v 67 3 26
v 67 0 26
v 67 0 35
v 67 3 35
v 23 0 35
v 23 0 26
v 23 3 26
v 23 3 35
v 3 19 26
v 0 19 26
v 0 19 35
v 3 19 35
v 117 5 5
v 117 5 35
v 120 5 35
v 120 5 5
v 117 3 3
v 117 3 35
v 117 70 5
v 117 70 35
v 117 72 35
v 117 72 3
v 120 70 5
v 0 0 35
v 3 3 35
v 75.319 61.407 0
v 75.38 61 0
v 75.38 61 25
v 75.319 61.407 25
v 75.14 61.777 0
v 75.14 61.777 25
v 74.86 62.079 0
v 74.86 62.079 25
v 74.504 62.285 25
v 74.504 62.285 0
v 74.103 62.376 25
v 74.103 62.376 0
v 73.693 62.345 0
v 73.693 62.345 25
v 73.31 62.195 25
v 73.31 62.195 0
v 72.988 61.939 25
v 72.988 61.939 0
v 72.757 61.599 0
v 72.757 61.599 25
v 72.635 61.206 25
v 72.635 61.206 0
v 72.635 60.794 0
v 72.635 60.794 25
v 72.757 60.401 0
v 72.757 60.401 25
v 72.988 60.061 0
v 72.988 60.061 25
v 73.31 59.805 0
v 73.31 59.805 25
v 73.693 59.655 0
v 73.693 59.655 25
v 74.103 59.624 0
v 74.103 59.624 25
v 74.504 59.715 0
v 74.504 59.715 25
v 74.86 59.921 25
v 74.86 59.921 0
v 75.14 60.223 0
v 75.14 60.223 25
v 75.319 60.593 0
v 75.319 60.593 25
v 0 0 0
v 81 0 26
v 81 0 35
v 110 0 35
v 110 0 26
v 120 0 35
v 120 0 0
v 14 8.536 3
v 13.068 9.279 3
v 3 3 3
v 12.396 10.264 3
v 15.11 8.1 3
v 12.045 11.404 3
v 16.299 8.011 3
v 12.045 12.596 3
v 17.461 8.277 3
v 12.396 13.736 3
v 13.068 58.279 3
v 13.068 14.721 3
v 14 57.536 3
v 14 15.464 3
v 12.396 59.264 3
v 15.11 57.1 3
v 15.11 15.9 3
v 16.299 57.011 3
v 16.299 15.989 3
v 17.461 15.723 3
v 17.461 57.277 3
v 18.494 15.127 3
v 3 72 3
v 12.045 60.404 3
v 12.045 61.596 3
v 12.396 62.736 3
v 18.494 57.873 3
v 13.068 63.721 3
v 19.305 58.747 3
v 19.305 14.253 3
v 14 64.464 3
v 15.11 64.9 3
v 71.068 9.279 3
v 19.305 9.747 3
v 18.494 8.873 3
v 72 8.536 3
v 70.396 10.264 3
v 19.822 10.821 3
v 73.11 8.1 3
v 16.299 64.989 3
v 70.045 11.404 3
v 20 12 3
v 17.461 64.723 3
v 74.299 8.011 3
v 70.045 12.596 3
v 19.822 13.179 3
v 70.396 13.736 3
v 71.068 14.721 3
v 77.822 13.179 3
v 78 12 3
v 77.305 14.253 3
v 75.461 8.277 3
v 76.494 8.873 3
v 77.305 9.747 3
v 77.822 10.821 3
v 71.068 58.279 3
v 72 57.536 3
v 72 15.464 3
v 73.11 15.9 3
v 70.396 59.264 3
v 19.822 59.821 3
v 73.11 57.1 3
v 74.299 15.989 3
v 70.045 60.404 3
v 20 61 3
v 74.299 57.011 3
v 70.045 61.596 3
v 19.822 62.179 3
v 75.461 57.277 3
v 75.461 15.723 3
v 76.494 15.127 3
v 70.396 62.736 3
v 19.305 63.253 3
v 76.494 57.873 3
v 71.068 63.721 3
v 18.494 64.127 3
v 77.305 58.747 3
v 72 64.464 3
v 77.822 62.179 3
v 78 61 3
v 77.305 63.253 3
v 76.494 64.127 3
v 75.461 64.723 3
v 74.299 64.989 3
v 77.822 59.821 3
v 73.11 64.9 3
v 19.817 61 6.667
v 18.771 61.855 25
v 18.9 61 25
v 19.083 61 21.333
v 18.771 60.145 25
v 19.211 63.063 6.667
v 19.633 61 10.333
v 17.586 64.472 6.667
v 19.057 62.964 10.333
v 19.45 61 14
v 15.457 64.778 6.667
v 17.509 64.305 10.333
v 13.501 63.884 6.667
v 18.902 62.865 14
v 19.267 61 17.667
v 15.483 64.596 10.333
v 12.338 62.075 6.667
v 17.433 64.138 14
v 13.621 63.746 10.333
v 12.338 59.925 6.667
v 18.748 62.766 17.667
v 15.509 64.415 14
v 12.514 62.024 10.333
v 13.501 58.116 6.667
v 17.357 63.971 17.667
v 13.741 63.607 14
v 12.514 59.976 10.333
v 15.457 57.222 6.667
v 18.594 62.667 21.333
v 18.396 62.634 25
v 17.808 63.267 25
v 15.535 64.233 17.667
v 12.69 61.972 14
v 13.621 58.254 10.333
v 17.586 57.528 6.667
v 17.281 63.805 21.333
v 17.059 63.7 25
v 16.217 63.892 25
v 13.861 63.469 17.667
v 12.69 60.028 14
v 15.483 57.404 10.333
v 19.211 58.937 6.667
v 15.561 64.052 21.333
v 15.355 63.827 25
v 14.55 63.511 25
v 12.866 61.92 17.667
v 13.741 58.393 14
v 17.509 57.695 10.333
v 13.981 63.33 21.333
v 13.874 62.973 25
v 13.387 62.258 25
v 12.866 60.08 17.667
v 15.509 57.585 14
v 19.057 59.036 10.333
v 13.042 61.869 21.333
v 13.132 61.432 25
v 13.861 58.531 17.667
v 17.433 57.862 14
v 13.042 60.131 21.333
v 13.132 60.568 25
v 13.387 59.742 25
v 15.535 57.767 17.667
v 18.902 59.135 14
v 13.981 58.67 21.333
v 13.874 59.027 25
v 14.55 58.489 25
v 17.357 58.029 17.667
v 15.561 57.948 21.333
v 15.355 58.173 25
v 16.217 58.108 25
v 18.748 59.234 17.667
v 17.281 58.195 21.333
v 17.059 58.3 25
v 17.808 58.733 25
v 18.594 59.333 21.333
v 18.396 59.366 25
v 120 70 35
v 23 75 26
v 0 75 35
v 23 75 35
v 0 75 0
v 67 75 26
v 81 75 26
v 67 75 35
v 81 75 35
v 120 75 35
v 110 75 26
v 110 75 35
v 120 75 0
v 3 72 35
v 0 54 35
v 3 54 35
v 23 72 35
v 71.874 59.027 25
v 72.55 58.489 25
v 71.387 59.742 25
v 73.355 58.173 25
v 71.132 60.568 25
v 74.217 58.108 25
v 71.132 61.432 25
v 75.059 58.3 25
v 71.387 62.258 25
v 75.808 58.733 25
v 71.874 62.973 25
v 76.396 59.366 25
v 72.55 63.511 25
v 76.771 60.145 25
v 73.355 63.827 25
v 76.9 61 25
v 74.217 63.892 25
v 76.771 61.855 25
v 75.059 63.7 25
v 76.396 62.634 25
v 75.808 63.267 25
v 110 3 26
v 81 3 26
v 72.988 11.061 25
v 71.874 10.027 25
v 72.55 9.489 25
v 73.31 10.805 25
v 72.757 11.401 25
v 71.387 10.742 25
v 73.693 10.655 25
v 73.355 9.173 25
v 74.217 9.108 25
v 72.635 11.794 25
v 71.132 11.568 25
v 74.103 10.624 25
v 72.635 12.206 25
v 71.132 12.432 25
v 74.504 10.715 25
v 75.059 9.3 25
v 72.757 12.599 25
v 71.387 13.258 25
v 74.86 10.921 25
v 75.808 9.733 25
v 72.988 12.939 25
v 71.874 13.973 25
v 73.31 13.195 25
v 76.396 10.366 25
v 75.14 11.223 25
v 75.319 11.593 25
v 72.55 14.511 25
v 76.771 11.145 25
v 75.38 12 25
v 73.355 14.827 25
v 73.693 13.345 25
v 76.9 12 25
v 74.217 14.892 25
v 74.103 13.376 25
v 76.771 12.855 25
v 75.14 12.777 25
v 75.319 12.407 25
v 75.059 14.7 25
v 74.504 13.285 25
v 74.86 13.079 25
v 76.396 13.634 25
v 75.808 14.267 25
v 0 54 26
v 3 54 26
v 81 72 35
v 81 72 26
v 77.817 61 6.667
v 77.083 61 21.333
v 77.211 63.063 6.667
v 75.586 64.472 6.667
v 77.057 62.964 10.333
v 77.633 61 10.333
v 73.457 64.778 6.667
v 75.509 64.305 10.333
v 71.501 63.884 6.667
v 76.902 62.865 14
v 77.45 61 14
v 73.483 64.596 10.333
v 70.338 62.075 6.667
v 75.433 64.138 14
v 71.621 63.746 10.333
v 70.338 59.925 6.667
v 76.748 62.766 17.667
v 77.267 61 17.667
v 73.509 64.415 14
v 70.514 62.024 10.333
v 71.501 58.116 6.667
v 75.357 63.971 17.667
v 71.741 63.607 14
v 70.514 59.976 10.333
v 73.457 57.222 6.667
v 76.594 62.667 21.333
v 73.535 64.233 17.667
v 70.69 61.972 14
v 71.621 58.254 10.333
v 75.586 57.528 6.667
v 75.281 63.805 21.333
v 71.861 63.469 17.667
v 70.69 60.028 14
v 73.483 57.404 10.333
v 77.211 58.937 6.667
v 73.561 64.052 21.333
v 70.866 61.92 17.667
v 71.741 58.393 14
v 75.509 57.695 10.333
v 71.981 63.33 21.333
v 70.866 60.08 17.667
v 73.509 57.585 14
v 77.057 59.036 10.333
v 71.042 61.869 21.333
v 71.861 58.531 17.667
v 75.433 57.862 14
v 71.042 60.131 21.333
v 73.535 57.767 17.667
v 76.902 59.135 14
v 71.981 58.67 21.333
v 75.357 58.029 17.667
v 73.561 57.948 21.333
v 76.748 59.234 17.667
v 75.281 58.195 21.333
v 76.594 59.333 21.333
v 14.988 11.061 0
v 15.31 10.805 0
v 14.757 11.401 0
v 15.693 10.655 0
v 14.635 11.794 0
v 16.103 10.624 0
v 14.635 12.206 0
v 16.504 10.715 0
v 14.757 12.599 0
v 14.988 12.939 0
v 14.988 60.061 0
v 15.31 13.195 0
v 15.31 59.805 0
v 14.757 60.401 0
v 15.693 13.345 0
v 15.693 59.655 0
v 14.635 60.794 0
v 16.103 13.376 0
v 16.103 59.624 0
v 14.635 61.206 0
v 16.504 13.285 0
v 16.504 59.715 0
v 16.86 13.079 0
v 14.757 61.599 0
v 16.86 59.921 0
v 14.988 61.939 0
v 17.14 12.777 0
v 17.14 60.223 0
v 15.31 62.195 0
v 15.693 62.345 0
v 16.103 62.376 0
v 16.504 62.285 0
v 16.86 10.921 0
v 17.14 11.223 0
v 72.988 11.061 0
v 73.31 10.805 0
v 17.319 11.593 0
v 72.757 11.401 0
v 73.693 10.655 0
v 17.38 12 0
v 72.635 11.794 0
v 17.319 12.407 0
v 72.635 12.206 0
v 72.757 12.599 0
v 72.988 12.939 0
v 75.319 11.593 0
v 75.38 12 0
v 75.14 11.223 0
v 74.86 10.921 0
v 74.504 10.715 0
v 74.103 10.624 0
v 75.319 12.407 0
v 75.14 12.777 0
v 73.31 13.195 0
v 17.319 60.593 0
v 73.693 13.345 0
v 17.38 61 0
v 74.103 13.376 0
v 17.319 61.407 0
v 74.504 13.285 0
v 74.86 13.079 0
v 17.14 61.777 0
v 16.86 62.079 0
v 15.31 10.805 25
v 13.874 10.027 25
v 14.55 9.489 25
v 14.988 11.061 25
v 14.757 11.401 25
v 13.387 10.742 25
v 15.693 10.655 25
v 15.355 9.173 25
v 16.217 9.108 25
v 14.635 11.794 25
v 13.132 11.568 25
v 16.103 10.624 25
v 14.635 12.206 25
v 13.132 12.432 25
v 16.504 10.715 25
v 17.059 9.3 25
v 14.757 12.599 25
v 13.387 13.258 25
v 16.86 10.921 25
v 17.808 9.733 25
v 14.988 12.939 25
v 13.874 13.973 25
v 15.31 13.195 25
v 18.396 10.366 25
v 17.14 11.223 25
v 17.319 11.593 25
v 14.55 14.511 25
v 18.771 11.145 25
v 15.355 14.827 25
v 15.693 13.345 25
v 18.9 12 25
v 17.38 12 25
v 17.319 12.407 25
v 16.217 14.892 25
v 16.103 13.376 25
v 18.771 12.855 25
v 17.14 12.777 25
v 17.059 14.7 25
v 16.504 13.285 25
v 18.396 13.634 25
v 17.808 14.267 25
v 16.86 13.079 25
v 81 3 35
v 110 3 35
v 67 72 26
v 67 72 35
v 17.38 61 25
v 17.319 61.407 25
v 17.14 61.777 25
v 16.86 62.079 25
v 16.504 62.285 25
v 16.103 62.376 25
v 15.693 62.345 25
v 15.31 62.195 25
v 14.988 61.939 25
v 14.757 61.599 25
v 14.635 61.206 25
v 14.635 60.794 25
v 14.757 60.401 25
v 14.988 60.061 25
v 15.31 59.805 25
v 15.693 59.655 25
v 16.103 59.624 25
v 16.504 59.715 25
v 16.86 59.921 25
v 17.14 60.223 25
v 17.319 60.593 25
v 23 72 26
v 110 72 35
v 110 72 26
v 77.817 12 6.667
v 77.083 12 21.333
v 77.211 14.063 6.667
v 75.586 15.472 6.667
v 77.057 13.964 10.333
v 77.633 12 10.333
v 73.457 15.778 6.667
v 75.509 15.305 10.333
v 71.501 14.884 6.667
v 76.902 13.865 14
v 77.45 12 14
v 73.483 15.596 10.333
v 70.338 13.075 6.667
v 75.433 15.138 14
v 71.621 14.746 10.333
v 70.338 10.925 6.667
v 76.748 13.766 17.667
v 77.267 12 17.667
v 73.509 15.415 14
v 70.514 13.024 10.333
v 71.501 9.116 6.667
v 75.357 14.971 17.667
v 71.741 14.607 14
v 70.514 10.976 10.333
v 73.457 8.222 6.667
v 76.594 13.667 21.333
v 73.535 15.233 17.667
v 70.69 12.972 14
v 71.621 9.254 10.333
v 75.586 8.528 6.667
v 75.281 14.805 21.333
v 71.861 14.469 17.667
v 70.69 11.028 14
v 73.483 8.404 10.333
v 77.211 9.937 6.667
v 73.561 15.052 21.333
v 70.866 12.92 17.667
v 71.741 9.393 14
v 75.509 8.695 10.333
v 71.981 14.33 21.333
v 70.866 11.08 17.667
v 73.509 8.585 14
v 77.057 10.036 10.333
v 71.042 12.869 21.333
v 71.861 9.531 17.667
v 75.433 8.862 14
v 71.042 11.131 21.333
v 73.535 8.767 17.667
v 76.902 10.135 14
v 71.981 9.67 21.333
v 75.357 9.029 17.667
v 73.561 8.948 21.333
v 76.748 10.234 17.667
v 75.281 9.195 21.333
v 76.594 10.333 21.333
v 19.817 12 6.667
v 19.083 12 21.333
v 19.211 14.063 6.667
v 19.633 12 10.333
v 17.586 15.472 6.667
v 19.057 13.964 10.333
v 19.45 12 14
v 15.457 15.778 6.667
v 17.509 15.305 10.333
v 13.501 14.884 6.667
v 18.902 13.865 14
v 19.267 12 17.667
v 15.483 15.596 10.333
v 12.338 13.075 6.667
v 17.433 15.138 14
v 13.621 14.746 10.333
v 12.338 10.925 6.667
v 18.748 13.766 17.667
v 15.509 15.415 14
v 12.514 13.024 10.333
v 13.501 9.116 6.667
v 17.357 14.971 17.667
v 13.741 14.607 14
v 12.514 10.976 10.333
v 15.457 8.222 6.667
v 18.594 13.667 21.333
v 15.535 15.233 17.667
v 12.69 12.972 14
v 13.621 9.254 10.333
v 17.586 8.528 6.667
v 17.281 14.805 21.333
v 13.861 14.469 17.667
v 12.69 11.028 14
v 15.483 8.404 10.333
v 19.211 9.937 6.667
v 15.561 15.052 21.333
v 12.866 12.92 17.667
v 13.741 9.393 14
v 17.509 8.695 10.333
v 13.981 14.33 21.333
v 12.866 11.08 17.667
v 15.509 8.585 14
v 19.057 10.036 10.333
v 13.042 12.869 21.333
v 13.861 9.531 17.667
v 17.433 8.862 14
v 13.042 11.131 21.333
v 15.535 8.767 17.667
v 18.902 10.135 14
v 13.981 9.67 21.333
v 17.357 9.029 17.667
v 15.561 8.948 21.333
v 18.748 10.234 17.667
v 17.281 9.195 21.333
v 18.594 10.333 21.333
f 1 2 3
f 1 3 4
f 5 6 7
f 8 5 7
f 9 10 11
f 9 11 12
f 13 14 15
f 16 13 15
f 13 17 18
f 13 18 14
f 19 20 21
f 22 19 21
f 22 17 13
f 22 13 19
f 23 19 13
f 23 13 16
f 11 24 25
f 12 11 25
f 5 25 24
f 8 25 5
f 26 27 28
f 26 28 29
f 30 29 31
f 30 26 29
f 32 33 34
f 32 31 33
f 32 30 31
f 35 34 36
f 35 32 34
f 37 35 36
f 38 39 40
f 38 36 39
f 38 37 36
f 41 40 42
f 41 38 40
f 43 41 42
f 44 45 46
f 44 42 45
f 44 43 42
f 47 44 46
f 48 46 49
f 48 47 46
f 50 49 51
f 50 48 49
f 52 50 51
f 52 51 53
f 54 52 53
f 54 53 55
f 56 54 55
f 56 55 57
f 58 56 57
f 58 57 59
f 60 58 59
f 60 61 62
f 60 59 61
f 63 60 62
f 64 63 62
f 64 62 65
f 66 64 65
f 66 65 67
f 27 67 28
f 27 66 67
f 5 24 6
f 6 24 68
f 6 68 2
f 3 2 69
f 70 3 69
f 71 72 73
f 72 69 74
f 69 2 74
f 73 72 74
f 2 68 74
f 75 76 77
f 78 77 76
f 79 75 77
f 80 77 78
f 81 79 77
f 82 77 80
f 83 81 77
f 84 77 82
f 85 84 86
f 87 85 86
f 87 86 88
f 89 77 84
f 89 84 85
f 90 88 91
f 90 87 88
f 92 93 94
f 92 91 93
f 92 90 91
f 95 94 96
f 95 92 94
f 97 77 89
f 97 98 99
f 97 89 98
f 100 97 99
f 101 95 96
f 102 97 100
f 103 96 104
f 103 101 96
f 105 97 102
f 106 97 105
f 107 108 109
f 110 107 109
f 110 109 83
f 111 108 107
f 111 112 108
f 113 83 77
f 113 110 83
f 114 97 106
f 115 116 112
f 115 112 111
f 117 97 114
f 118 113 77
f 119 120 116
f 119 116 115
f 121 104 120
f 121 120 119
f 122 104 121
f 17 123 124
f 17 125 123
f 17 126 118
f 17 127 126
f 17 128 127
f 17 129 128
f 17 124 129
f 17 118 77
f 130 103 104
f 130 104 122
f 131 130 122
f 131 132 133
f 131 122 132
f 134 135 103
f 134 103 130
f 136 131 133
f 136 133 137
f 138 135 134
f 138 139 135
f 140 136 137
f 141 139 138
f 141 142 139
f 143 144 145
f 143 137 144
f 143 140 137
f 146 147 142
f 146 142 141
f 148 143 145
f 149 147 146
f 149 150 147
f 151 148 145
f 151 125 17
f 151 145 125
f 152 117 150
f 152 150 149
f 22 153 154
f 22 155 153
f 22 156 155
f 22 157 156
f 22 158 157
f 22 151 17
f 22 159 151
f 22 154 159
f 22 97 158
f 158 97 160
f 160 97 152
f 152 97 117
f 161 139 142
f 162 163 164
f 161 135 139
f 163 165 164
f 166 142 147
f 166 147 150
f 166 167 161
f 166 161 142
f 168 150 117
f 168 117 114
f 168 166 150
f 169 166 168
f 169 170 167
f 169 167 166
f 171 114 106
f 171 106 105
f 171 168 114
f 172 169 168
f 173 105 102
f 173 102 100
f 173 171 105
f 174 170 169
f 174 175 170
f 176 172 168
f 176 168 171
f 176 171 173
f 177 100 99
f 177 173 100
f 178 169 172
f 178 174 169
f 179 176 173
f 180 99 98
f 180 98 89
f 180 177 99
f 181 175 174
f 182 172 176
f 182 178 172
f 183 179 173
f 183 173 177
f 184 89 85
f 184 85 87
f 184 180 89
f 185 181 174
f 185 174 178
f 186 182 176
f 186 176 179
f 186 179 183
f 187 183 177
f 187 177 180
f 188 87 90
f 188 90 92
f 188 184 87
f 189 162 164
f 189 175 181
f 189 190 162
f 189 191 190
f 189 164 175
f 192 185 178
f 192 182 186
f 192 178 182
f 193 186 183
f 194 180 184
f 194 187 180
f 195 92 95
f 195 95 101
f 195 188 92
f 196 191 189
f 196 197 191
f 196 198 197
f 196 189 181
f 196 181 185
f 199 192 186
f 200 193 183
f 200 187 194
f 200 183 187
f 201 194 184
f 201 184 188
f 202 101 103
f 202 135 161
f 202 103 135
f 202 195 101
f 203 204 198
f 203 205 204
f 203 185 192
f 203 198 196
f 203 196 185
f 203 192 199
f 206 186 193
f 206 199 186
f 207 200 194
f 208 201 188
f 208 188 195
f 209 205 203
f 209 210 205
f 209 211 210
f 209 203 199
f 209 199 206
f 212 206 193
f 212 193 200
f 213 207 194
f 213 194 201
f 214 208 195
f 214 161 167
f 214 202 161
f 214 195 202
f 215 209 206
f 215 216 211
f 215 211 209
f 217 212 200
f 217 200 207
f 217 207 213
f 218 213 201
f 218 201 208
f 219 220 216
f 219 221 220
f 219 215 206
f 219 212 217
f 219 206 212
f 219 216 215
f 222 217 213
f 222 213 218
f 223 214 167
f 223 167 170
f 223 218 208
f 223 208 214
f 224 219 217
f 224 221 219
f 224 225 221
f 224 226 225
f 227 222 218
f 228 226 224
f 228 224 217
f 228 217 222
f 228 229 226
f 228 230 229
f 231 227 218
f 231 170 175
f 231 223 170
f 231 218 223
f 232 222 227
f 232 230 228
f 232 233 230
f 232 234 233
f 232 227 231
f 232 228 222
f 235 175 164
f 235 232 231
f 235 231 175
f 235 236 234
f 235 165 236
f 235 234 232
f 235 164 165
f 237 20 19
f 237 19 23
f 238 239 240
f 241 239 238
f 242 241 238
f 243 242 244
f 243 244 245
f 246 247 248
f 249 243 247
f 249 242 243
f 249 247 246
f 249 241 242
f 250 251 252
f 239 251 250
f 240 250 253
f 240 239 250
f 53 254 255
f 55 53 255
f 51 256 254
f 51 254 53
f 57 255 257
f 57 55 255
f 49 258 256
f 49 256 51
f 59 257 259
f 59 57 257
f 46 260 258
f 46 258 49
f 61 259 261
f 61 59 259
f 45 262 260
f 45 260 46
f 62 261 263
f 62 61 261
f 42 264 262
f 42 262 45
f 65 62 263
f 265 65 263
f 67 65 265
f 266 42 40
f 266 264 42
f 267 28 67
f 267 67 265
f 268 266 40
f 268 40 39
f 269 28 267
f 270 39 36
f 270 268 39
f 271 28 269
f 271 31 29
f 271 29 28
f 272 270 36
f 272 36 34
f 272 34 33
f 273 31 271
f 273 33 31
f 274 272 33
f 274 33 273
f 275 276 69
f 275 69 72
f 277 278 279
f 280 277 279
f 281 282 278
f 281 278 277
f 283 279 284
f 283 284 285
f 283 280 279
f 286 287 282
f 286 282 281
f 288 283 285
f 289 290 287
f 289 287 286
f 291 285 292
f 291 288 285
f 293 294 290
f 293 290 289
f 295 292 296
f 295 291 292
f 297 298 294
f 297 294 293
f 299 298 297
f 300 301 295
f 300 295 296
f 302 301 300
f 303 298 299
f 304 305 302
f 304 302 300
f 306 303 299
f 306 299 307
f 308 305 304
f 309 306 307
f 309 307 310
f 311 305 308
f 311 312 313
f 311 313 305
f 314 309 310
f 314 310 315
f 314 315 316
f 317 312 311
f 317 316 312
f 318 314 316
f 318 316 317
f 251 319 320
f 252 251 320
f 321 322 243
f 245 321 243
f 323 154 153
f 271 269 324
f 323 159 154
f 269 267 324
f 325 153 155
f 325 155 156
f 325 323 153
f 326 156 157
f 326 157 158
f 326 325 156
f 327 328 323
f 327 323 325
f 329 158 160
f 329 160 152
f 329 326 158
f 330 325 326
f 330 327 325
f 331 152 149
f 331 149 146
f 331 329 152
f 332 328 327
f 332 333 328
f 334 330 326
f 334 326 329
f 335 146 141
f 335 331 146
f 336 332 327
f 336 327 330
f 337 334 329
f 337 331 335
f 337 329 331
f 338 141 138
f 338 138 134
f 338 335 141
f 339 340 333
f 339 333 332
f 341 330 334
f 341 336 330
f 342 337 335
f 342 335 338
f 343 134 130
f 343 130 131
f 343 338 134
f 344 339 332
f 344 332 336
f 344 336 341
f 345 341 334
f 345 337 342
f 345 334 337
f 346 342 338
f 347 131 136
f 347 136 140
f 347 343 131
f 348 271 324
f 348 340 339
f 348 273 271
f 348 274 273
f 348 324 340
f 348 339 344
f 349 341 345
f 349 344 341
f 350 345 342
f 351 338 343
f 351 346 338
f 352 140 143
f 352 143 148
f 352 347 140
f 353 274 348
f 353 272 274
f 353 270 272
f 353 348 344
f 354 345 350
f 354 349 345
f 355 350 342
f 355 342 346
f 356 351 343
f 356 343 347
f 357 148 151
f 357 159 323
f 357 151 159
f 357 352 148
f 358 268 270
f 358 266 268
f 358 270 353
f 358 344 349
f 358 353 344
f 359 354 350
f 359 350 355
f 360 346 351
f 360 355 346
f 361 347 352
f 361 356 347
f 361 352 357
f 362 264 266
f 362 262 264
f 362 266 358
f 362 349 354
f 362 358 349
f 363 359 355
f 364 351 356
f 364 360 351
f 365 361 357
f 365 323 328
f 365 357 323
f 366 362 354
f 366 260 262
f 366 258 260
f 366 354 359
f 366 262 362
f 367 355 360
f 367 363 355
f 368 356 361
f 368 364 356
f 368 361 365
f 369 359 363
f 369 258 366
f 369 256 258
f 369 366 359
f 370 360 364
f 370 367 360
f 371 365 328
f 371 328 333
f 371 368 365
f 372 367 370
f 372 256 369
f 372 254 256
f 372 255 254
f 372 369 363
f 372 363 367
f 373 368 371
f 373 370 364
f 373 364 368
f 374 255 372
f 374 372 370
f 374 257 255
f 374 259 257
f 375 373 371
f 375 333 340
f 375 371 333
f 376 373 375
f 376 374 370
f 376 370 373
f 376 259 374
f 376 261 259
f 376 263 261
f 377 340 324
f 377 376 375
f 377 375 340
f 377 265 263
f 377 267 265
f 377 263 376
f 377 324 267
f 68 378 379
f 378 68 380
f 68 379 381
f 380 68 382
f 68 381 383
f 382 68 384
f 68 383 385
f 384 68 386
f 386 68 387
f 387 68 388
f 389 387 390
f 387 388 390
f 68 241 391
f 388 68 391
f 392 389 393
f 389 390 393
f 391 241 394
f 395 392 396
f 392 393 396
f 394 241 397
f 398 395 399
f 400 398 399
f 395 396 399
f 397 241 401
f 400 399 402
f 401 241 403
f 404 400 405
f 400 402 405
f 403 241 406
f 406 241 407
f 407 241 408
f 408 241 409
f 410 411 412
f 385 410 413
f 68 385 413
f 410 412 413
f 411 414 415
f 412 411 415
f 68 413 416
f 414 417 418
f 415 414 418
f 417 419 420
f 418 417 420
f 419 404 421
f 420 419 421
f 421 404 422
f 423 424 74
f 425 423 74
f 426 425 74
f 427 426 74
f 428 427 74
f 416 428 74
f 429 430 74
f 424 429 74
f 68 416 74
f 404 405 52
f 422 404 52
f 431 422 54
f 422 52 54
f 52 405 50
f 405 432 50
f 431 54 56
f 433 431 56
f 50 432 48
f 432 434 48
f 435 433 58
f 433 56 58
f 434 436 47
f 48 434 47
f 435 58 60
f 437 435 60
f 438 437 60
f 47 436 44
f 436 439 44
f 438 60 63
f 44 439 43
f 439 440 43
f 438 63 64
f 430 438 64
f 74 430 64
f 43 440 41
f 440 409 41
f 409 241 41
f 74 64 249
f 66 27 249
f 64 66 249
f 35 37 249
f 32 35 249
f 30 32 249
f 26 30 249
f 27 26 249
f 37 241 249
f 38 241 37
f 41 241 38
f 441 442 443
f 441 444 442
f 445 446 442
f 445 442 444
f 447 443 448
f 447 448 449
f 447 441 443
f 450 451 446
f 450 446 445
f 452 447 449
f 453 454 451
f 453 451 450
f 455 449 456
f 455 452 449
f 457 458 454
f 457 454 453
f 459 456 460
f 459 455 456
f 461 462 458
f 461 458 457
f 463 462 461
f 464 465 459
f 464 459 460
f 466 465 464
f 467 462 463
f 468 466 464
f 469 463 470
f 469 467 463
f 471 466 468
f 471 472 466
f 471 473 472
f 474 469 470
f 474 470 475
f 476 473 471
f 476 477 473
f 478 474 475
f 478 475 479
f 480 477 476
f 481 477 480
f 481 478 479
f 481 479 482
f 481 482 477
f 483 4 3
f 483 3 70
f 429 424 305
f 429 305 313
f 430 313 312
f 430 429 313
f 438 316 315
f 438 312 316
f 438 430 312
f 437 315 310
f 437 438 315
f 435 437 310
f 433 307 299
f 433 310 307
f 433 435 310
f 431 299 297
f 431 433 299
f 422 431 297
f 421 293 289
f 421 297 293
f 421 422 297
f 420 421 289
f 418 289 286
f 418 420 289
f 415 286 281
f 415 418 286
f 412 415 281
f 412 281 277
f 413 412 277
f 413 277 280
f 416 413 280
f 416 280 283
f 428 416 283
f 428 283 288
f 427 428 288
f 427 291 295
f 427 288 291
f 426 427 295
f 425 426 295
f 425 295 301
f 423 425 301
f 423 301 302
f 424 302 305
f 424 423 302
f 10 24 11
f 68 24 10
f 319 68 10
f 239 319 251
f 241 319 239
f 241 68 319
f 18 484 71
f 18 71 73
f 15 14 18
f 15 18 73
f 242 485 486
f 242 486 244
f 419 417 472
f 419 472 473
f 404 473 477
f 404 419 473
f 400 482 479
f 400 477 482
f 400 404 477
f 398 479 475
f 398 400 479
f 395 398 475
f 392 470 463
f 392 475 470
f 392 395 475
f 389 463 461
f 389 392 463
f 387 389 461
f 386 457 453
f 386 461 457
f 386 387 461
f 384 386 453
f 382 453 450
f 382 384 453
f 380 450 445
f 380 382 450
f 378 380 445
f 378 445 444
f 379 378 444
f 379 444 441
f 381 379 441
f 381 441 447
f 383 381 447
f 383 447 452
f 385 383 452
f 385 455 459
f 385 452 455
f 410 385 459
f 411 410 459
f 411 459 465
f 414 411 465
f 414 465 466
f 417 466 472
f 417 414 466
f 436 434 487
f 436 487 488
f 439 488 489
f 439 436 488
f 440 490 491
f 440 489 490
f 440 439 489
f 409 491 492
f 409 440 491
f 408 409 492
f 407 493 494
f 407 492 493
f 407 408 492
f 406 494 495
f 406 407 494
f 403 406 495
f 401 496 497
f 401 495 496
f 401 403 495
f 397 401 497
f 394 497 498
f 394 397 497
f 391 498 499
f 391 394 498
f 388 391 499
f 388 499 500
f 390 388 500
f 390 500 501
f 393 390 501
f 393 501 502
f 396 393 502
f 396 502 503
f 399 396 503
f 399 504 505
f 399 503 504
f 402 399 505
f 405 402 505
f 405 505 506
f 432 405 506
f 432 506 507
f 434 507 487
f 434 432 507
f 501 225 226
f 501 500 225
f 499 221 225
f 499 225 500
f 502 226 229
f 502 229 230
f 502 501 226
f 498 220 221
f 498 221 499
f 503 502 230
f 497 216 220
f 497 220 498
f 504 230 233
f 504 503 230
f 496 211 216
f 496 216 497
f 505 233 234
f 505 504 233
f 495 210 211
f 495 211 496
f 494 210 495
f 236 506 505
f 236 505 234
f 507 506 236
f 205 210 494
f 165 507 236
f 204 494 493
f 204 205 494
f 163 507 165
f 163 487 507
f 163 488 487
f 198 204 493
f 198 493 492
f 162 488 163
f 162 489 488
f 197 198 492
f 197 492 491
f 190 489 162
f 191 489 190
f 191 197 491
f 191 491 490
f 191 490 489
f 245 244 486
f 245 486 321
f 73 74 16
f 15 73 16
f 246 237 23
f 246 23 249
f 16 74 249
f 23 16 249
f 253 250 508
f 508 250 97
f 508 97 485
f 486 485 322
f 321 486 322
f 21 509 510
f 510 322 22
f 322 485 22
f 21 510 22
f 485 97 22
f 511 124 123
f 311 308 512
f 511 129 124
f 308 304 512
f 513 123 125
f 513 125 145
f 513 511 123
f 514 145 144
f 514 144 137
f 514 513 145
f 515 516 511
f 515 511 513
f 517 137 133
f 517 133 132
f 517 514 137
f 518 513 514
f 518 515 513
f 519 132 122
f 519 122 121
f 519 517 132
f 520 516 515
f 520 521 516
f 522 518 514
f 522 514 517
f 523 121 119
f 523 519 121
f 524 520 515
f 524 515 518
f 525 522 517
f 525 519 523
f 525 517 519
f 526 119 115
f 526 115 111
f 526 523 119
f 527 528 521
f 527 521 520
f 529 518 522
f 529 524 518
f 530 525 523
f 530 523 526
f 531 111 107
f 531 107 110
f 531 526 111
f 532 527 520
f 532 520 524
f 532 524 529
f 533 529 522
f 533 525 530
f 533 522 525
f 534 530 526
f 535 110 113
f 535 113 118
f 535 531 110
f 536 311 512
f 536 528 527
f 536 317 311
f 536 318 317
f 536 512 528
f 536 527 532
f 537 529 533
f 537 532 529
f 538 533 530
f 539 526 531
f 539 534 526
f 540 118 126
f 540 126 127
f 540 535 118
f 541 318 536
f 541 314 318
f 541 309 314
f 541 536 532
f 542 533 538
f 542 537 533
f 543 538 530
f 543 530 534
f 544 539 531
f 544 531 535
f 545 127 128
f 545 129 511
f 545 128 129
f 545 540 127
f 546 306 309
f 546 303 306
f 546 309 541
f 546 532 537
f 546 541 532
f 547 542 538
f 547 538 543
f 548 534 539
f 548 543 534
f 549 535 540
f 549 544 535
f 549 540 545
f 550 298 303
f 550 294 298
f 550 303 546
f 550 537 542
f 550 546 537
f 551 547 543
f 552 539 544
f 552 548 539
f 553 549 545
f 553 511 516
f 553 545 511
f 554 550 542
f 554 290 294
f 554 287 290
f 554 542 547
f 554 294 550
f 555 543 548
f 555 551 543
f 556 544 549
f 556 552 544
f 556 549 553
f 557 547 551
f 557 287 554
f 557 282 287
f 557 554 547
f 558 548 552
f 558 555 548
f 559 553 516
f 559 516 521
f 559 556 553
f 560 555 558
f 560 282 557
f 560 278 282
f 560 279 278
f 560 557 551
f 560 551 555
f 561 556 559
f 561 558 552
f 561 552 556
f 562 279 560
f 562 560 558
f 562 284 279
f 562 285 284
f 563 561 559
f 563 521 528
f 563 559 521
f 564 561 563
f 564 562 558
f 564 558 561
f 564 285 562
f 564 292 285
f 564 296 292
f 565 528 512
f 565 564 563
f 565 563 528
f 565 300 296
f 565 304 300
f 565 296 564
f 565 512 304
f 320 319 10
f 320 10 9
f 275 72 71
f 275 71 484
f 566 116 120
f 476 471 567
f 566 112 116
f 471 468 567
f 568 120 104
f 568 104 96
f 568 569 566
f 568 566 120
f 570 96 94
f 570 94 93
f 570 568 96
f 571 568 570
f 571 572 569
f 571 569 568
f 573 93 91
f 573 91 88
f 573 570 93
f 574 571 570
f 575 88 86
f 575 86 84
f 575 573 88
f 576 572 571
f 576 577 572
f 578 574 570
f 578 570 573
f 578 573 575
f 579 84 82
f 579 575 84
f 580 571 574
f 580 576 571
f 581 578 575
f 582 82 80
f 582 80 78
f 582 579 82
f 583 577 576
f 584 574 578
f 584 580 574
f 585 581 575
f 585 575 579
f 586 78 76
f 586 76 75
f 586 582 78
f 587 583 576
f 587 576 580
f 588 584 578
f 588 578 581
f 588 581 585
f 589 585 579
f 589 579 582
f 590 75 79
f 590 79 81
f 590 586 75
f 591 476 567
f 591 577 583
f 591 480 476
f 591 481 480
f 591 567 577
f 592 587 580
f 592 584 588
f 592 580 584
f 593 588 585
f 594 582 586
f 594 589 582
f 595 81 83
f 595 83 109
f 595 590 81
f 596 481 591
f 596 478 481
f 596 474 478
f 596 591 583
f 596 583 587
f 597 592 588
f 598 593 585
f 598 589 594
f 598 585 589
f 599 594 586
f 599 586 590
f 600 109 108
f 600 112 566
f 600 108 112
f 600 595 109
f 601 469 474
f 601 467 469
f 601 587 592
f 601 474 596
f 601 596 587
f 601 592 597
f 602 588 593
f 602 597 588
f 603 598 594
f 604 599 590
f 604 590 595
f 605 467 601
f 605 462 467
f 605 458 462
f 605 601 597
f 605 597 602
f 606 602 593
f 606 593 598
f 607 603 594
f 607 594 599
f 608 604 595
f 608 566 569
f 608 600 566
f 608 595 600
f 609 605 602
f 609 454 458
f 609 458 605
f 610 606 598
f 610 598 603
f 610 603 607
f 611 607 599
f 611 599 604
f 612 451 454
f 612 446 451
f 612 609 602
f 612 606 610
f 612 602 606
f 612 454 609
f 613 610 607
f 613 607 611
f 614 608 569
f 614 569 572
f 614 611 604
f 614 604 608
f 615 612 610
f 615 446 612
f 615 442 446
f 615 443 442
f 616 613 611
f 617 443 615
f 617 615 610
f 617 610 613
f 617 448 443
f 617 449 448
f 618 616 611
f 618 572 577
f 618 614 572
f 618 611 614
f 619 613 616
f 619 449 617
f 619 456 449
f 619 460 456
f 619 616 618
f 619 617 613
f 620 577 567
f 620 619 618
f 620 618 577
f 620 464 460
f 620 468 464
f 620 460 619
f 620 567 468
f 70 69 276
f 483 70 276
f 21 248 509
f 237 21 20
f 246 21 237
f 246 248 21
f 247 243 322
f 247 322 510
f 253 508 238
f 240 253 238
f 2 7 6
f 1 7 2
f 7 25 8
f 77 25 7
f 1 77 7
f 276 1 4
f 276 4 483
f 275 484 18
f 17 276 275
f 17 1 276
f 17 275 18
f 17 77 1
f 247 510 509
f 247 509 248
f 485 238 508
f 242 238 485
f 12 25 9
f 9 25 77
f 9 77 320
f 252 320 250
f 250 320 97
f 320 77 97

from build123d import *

# Parameters (mm, degrees)
CYLINDER023_R     = 1.38
CYLINDER023_DEPTH = 30
CYLINDER022_R     = 1.38
CYLINDER022_DEPTH = 30
CYLINDER021_R     = 1.38
CYLINDER021_DEPTH = 30
CYLINDER020_R     = 1.38
CYLINDER020_DEPTH = 30
BOX006_W          = 10
BOX006_H          = 65
BOX006_DEPTH      = 35
BOX011_W          = 20
BOX011_H          = 35
BOX011_DEPTH      = 10
BOX010_W          = 29
BOX010_H          = 20
BOX010_DEPTH      = 10
BOX009_W          = 29
BOX009_H          = 20
BOX009_DEPTH      = 10
BOX008_W          = 44
BOX008_H          = 20
BOX008_DEPTH      = 10
BOX007_W          = 44
BOX007_H          = 20
BOX007_DEPTH      = 10
BOX005_W          = 114
BOX005_H          = 69
BOX005_DEPTH      = 35
BOX004_W          = 120
BOX004_H          = 75
BOX004_DEPTH      = 35


with BuildPart() as cylinder023:
    # Cylinder023 → Cylinder023 (new body)
    with BuildSketch(Plane(origin=(74, 61, -2), x_dir=(1, 0, 0), z_dir=(0, 0, 1))):
        Circle(CYLINDER023_R)
    extrude(amount=CYLINDER023_DEPTH)


with BuildPart() as cylinder022:
    # Cylinder022 → Cylinder022 (new body)
    with BuildSketch(Plane(origin=(16, 61, -2), x_dir=(1, 0, 0), z_dir=(0, 0, 1))):
        Circle(CYLINDER022_R)
    extrude(amount=CYLINDER022_DEPTH)


with BuildPart() as cylinder021:
    # Cylinder021 → Cylinder021 (new body)
    with BuildSketch(Plane(origin=(16, 12, -2), x_dir=(1, 0, 0), z_dir=(0, 0, 1))):
        Circle(CYLINDER021_R)
    extrude(amount=CYLINDER021_DEPTH)


with BuildPart() as fusion008:
    # Cylinder020 → Cylinder020 (new body)
    with BuildSketch(Plane(origin=(74, 12, -2), x_dir=(1, 0, 0), z_dir=(0, 0, 1))):
        Circle(CYLINDER020_R)
    extrude(amount=CYLINDER020_DEPTH)

    # Fusion008: union Cylinder023, Cylinder022, Cylinder021
    add(cylinder023.part)
    add(cylinder022.part)
    add(cylinder021.part)


with BuildPart() as kegel003:
    # Cone003 → Cone003 (revolve)
    with BuildSketch(Plane(origin=(16, 61, 3), x_dir=(1, 0, 0), z_dir=(0, -1, 0))):
        Polygon((0, 0), (4, 0), (2.9, 22), (0, 22), align=None)
    revolve(axis=Axis((16, 61, 3), (0, 0, 1)))


with BuildPart() as kegel002:
    # Cone002 → Cone002 (revolve)
    with BuildSketch(Plane(origin=(16, 12, 3), x_dir=(1, 0, 0), z_dir=(0, -1, 0))):
        Polygon((0, 0), (4, 0), (2.9, 22), (0, 22), align=None)
    revolve(axis=Axis((16, 12, 3), (0, 0, 1)))


with BuildPart() as kegel001:
    # Cone001 → Cone001 (revolve)
    with BuildSketch(Plane(origin=(74, 61, 3), x_dir=(1, 0, 0), z_dir=(0, -1, 0))):
        Polygon((0, 0), (4, 0), (2.9, 22), (0, 22), align=None)
    revolve(axis=Axis((74, 61, 3), (0, 0, 1)))


with BuildPart() as fusion015:
    # Cone → Cone (revolve)
    with BuildSketch(Plane(origin=(74, 12, 3), x_dir=(1, 0, 0), z_dir=(0, -1, 0))):
        Polygon((0, 0), (4, 0), (2.9, 22), (0, 22), align=None)
    revolve(axis=Axis((74, 12, 3), (0, 0, 1)))

    # Fusion015: union Kegel003, Kegel002, Kegel001
    add(kegel003.part)
    add(kegel002.part)
    add(kegel001.part)


with BuildPart() as rj45_usb_cutout:
    # Box006 → Box006 (new body)
    with BuildSketch(Plane(origin=(115, 5, 5), x_dir=(1, 0, 0), z_dir=(0, 0, 1))):
        with Locations((5, 32.5)):
            Rectangle(BOX006_W, BOX006_H)
    extrude(amount=BOX006_DEPTH)


with BuildPart() as w_rfel006:
    # Box011 → Box011 (new body)
    with BuildSketch(Plane(origin=(-10, 19, 26), x_dir=(1, 0, 0), z_dir=(0, 0, 1))):
        with Locations((10, 17.5)):
            Rectangle(BOX011_W, BOX011_H)
    extrude(amount=BOX011_DEPTH)


with BuildPart() as w_rfel005:
    # Box010 → Box010 (new body)
    with BuildSketch(Plane(origin=(81, 60, 26), x_dir=(1, 0, 0), z_dir=(0, 0, 1))):
        with Locations((14.5, 10)):
            Rectangle(BOX010_W, BOX010_H)
    extrude(amount=BOX010_DEPTH)


with BuildPart() as w_rfel004:
    # Box009 → Box009 (new body)
    with BuildSketch(Plane(origin=(81, -10, 26), x_dir=(1, 0, 0), z_dir=(0, 0, 1))):
        with Locations((14.5, 10)):
            Rectangle(BOX009_W, BOX009_H)
    extrude(amount=BOX009_DEPTH)


with BuildPart() as w_rfel003:
    # Box008 → Box008 (new body)
    with BuildSketch(Plane(origin=(23, 68, 26), x_dir=(1, 0, 0), z_dir=(0, 0, 1))):
        with Locations((22, 10)):
            Rectangle(BOX008_W, BOX008_H)
    extrude(amount=BOX008_DEPTH)


with BuildPart() as fusion014:
    # Box007 → Box007 (new body)
    with BuildSketch(Plane(origin=(23, -10, 26), x_dir=(1, 0, 0), z_dir=(0, 0, 1))):
        with Locations((22, 10)):
            Rectangle(BOX007_W, BOX007_H)
    extrude(amount=BOX007_DEPTH)

    # Fusion010: union Würfel006, Würfel005, Würfel004, Würfel003
    add(w_rfel006.part)
    add(w_rfel005.part)
    add(w_rfel004.part)
    add(w_rfel003.part)

    # Fusion014: union RJ45_USB_Cutout
    add(rj45_usb_cutout.part)


with BuildPart() as w_rfel001:
    # Box005 → Box005 (new body)
    with BuildSketch(Plane(origin=(3, 3, 3), x_dir=(1, 0, 0), z_dir=(0, 0, 1))):
        with Locations((57, 34.5)):
            Rectangle(BOX005_W, BOX005_H)
    extrude(amount=BOX005_DEPTH)


with BuildPart() as deckelkonstruktion:
    # Box004 → Box004 (new body)
    with BuildSketch(Plane.XY):
        with Locations((60, 37.5)):
            Rectangle(BOX004_W, BOX004_H)
    extrude(amount=BOX004_DEPTH)

    # Cut006: cut Würfel001
    add(w_rfel001.part, mode=Mode.SUBTRACT)

    # Cut007: cut Fusion014
    add(fusion014.part, mode=Mode.SUBTRACT)

    # Fusion016: union Fusion015
    add(fusion015.part)

    # Cut008: cut Fusion008
    add(fusion008.part, mode=Mode.SUBTRACT)


solid = deckelkonstruktion.part
